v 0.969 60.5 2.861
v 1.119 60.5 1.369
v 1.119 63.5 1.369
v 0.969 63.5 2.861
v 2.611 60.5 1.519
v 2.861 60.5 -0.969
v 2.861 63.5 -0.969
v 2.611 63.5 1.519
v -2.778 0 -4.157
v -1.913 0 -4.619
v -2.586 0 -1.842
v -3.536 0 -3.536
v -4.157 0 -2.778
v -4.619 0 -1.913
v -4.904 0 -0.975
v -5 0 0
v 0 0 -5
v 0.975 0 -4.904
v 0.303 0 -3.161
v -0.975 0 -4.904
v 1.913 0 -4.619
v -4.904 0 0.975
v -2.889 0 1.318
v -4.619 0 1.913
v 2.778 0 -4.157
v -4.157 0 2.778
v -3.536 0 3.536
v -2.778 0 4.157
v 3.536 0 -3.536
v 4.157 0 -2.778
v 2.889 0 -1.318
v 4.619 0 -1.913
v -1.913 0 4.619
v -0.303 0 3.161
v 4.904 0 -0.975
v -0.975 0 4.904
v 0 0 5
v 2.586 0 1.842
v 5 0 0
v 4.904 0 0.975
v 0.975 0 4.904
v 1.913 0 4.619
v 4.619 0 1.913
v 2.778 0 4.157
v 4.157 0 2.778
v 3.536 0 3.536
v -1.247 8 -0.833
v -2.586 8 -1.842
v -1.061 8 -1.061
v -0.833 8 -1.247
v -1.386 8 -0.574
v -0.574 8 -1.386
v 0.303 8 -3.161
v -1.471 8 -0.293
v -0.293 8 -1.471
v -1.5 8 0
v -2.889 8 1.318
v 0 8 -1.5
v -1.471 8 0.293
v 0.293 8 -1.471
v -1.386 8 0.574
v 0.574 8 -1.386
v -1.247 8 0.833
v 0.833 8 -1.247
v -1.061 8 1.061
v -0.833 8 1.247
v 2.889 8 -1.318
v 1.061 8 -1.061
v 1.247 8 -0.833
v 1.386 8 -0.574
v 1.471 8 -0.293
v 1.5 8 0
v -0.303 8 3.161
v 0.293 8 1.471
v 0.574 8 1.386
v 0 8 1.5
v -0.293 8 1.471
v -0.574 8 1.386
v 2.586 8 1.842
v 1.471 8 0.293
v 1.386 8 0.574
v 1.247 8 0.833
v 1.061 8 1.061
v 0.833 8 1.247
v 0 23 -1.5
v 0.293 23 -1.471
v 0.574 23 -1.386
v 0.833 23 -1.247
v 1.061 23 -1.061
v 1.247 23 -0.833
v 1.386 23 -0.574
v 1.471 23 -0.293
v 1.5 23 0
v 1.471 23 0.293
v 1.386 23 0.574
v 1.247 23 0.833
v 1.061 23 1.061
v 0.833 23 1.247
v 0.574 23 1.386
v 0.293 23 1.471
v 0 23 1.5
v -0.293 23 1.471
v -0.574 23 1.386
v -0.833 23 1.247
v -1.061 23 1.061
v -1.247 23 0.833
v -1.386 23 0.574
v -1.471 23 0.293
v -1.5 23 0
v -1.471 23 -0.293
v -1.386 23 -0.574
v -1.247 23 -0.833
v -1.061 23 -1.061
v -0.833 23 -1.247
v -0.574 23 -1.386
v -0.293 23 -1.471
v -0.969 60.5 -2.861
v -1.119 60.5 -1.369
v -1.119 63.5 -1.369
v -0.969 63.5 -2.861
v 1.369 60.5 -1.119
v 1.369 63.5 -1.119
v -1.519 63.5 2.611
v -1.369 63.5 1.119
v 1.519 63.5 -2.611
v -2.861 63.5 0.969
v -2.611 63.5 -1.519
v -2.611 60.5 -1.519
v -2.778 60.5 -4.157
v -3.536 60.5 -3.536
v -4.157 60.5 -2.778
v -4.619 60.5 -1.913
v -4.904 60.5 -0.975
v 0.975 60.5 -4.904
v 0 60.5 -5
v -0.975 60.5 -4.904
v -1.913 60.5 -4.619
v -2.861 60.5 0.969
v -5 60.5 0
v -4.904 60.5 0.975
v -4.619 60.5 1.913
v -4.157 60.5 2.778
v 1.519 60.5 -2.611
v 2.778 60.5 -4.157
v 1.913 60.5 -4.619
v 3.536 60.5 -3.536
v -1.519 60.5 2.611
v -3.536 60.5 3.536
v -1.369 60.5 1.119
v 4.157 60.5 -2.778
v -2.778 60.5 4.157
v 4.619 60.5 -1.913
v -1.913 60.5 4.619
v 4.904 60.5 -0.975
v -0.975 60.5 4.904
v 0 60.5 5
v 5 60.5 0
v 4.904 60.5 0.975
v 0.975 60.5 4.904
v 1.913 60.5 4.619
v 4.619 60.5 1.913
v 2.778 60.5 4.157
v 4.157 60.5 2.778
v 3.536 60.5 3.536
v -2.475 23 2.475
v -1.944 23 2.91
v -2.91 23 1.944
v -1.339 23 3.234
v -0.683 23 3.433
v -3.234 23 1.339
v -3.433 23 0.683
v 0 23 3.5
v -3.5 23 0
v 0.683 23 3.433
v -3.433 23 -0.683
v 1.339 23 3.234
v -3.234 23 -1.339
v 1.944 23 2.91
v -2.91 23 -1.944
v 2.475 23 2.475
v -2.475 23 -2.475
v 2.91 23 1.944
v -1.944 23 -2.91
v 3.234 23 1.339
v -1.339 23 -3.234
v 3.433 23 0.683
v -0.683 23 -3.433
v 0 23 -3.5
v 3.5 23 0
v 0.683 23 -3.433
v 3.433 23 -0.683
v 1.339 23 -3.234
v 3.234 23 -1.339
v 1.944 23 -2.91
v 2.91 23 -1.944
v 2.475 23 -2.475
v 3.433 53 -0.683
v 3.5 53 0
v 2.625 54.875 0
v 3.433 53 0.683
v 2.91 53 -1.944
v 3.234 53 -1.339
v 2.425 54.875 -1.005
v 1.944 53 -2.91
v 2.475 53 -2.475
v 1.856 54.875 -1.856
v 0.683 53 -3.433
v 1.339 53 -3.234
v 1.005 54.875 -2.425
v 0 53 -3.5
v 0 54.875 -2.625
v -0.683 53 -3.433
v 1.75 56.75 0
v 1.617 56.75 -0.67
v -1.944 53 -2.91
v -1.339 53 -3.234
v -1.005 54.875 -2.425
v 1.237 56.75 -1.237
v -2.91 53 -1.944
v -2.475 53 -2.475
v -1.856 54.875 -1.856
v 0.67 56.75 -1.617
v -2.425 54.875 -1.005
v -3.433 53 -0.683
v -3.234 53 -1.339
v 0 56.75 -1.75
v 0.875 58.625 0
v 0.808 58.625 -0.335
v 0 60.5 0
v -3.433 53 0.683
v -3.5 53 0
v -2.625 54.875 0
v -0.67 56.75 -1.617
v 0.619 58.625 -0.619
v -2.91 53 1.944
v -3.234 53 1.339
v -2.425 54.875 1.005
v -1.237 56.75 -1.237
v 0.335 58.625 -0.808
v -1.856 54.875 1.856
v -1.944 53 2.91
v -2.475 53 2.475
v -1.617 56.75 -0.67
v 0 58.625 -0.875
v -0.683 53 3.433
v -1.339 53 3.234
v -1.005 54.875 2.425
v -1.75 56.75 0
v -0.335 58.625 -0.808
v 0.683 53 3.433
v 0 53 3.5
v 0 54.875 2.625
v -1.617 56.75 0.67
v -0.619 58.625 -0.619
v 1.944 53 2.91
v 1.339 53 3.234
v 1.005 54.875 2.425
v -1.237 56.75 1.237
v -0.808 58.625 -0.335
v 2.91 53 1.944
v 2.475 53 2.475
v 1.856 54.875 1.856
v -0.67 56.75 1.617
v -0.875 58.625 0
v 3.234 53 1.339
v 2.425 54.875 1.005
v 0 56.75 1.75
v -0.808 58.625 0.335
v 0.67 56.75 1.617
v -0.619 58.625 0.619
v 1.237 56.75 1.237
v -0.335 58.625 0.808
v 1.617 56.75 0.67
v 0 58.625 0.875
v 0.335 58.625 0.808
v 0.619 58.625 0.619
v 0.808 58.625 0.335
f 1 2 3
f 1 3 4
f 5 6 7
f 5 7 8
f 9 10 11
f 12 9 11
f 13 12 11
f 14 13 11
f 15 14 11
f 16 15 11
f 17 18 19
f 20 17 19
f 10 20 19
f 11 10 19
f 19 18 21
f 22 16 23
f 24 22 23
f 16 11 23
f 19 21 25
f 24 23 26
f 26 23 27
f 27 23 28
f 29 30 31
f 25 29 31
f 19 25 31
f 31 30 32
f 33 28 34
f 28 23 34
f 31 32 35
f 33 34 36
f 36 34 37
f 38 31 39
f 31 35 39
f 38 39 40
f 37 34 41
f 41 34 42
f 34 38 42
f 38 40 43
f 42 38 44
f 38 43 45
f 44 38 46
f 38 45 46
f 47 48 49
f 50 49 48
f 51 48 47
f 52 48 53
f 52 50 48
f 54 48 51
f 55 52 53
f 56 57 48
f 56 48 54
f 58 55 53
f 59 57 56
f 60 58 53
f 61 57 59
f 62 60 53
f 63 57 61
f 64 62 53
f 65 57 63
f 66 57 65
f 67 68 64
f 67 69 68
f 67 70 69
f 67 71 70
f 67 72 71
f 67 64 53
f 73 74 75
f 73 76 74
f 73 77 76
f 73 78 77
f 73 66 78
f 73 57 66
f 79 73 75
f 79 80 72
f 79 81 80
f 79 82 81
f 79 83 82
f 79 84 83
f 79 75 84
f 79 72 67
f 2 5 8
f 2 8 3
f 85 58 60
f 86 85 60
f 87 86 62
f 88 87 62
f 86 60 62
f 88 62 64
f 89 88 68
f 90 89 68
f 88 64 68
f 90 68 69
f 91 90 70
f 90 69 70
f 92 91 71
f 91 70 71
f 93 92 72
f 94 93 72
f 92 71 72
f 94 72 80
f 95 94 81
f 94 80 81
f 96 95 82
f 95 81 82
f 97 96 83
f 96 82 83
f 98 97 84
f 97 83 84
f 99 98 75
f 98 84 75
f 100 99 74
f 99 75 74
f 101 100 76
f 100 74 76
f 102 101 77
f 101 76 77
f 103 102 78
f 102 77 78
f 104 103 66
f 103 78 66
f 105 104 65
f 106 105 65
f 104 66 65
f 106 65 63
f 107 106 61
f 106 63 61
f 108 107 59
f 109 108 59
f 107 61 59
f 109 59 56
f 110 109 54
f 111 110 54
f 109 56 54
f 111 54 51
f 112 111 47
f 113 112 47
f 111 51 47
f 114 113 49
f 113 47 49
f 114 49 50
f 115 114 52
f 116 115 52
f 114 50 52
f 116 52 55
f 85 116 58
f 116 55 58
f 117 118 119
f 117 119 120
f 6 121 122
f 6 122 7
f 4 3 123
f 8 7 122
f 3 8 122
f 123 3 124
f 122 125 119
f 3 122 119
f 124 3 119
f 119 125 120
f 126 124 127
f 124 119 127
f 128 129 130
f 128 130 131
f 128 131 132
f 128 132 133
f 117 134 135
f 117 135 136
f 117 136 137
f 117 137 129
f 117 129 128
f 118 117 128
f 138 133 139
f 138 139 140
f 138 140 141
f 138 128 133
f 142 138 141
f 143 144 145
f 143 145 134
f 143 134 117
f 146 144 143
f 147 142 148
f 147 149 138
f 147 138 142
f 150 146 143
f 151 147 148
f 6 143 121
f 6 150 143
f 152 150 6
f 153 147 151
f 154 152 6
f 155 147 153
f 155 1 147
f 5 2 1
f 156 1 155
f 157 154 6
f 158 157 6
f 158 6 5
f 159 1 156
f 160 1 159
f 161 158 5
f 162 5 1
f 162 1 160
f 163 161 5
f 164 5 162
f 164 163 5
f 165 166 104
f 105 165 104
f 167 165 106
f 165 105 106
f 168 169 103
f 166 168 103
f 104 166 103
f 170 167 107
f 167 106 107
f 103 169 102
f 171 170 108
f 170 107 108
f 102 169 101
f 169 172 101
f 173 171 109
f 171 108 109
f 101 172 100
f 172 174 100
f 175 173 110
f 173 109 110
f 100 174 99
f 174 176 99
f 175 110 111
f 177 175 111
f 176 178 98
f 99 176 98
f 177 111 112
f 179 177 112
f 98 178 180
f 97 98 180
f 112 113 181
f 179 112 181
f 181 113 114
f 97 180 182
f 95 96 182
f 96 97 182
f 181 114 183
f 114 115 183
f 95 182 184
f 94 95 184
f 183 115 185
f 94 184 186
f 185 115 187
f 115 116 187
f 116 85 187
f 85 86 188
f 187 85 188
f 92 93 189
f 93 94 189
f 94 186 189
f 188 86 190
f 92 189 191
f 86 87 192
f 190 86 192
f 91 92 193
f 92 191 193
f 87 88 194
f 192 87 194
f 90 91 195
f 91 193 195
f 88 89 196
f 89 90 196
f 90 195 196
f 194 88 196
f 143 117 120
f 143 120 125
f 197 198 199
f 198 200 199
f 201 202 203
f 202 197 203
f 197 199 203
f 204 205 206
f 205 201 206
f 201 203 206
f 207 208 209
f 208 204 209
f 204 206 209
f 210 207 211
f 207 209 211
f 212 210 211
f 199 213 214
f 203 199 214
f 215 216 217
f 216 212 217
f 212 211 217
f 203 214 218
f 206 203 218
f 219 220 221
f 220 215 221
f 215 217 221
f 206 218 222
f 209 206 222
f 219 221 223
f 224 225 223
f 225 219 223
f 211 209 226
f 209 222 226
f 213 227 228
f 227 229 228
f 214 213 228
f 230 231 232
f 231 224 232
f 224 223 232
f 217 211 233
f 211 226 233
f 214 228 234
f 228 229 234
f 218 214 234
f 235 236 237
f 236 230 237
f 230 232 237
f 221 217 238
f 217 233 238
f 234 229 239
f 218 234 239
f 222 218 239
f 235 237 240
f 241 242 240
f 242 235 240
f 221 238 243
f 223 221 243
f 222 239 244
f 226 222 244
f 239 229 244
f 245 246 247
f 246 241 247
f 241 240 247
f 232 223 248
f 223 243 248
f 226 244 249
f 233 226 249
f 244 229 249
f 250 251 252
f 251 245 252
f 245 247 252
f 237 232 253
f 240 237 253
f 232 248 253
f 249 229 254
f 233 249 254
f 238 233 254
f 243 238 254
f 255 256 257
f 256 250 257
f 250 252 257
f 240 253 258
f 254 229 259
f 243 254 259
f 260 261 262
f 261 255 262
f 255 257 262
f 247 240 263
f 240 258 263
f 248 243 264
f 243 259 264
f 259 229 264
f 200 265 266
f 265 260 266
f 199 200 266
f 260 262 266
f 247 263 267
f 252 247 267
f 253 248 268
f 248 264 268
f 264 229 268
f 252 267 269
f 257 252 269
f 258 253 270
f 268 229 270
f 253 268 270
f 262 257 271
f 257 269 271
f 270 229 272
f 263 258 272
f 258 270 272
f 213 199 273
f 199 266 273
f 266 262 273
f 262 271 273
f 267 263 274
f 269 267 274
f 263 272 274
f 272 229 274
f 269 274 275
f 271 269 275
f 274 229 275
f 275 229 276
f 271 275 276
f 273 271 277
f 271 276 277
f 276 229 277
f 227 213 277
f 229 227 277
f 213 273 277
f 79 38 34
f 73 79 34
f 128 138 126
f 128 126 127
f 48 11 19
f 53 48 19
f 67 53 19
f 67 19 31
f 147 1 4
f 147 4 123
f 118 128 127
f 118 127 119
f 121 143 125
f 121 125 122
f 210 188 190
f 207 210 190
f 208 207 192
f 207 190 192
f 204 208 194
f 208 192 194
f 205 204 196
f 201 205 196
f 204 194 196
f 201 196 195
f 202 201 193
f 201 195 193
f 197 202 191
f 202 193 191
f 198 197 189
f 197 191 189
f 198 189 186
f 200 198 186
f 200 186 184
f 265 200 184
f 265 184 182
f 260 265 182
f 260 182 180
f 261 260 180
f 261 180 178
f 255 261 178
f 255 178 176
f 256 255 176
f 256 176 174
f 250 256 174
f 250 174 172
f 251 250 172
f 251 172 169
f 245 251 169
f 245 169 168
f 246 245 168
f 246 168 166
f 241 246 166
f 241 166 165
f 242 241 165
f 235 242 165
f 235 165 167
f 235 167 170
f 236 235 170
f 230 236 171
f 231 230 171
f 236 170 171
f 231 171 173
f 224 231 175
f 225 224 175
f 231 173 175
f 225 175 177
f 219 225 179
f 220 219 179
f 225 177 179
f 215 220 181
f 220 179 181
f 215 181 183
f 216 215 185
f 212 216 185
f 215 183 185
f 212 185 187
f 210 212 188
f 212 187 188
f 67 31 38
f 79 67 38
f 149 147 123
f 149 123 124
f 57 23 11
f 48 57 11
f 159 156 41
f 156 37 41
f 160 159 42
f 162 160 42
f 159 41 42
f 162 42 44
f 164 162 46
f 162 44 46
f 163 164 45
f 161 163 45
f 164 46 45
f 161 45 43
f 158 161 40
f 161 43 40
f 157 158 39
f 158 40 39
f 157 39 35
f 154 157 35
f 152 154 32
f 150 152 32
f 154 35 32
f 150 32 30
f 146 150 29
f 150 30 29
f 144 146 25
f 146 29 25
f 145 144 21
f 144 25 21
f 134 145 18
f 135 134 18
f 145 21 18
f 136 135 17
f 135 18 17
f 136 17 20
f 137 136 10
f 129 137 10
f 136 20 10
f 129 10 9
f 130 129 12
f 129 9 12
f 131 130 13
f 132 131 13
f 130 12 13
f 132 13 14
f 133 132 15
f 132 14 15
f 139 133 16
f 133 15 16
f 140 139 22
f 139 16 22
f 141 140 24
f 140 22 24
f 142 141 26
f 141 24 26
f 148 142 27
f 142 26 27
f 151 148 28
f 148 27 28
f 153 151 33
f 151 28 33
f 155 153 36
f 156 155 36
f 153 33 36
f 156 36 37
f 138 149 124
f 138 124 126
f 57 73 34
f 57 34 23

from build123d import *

# Parameters (mm, degrees)
SKETCH_1_R          = 5
EXTRUDE_1_DEPTH     = 2
EXTRUDE_2_DEPTH     = 3.5
EXTRUDE_3_DEPTH     = 3.5
SKETCH_4_R          = 5
EXTRUDE_4_DEPTH     = 0.5
CUT_EXTRUDE_2_DEPTH = 3
CUT_EXTRUDE_3_DEPTH = 2
EXTRUDE_5_DEPTH     = 58
SKETCH_8_R          = 5
EXTRUDE_6_DEPTH     = 58
CUT_EXTRUDE_4_DEPTH = 8
SKETCH_10_R         = 1.5
CUT_EXTRUDE_5_DEPTH = 15
SKETCH_11_R         = 3.5
CUT_EXTRUDE_6_DEPTH = 30
SKETCH_12_R         = 1
CUT_EXTRUDE_7_DEPTH = 7
SKETCH_13_R         = 3.5
SKETCH_14_R         = 1


# Read off the part's stored shape, not the designer's step: 切除-扫描1
with BuildPart() as part:
    # 草图1 → 凸台-拉伸1 (new body)
    with BuildSketch(Plane(origin=(0, 0, 0), x_dir=(1, 0, 0), z_dir=(0, 1, 0))):
        with Locations(Location((0, 0, 0), (0, 0, 270))):
            Circle(SKETCH_1_R)
        Polygon((2.55392077, -1.838021228), (2.868733461, 1.292749652), (0.314812691, 3.13077088), (-2.55392077, 1.838021228), (-2.868733461, -1.292749652), (-0.314812691, -3.13077088), align=None, mode=Mode.SUBTRACT)
    extrude(amount=EXTRUDE_1_DEPTH)

    # 草图2 → 凸台-拉伸2 (add)
    with BuildSketch(Plane(origin=(0, 2, 0), x_dir=(1, 0, 0), z_dir=(0, 1, 0))):
        Polygon((-2.834872538, 1.792623133), (3.135022029, 1.192324151), (2.834872538, -1.792623133), (-3.135022029, -1.192324151), align=None)
    extrude(amount=EXTRUDE_2_DEPTH)

    # 草图3 → 凸台-拉伸3 (add)
    with BuildSketch(Plane(origin=(0, 2, 0), x_dir=(1, 0, 0), z_dir=(0, 1, 0))):
        Polygon((-1.192324151, 3.135022029), (-1.792623133, -2.834872538), (1.192324151, -3.135022029), (1.792623133, 2.834872538), align=None)
    extrude(amount=EXTRUDE_3_DEPTH)

    # 草图4 → 凸台-拉伸4 (add)
    with BuildSketch(Plane(origin=(0, 2, 0), x_dir=(1, 0, 0), z_dir=(0, 1, 0))):
        with Locations(Location((0, 0, 0), (0, 0, 270))):
            Circle(SKETCH_4_R)
    extrude(amount=EXTRUDE_4_DEPTH)

    # 草图5 → 切除-拉伸2 (cut)
    with BuildSketch(Plane(origin=(0, 5.5, 0), x_dir=(1, 0, 0), z_dir=(0, 1, 0))):
        Polygon((-3.135022029, -1.192324151), (-2.834872538, 1.792623133), (-1.342398896, 1.642548387), (-1.192324151, 3.135022029), (1.792623133, 2.834872538), (1.642548387, 1.342398896), (3.135022029, 1.192324151), (2.834872538, -1.792623133), (1.342398896, -1.642548387), (1.192324151, -3.135022029), (-1.792623133, -2.834872538), (-1.642548387, -1.342398896), align=None)
        Polygon((-1.093653289, 1.617535929), (-0.968591001, 2.861263964), (1.518865068, 2.611139388), (1.39380278, 1.367411354), (1.368790323, 1.118665747), (1.617535929, 1.093653289), (2.861263964, 0.968591001), (2.611139388, -1.518865068), (1.367411354, -1.39380278), (1.118665747, -1.368790323), (1.093653289, -1.617535929), (0.968591001, -2.861263964), (-1.518865068, -2.611139388), (-1.39380278, -1.367411354), (-1.368790323, -1.118665747), (-1.617535929, -1.093653289), (-2.861263964, -0.968591001), (-2.611139388, 1.518865068), (-1.367411354, 1.39380278), (-1.118665747, 1.368790323), align=None, mode=Mode.SUBTRACT)
    extrude(amount=-CUT_EXTRUDE_2_DEPTH, mode=Mode.SUBTRACT)

    # 草图6 → 切除-拉伸3 (cut)
    with BuildSketch(Plane.XZ):
        Polygon((2.888759724, -1.318484202), (2.586220675, 1.842497205), (-0.302539048, 3.160981407), (-2.888759724, 1.318484202), (-2.586220675, -1.842497205), (0.302539048, -3.160981407), align=None)
    extrude(amount=-CUT_EXTRUDE_3_DEPTH, mode=Mode.SUBTRACT)

    # 草图7 → 凸台-拉伸5 (add)
    with BuildSketch(Plane(origin=(0, 5.5, 0), x_dir=(1, 0, 0), z_dir=(0, 1, 0))):
        Polygon((-1.118665747, 1.368790323), (-0.968591001, 2.861263964), (1.518865068, 2.611139388), (1.368790323, 1.118665747), (2.861263964, 0.968591001), (2.611139388, -1.518865068), (1.118665747, -1.368790323), (0.968591001, -2.861263964), (-1.518865068, -2.611139388), (-1.368790323, -1.118665747), (-2.861263964, -0.968591001), (-2.611139388, 1.518865068), align=None)
    extrude(amount=EXTRUDE_5_DEPTH)

    # 草图8 → 凸台-拉伸6 (add)
    with BuildSketch(Plane(origin=(0, 2.5, 0), x_dir=(1, 0, 0), z_dir=(0, 1, 0))):
        with Locations(Location((0, 0, 0), (0, 0, 270))):
            Circle(SKETCH_8_R)
    extrude(amount=EXTRUDE_6_DEPTH)

    # 草图9 → 切除-拉伸4 (cut)
    with BuildSketch(Plane.XZ):
        Polygon((2.888759724, -1.318484202), (2.586220675, 1.842497205), (-0.302539048, 3.160981407), (-2.888759724, 1.318484202), (-2.586220675, -1.842497205), (0.302539048, -3.160981407), align=None)
    extrude(amount=-CUT_EXTRUDE_4_DEPTH, mode=Mode.SUBTRACT)

    # 草图10 → 切除-拉伸5 (cut)
    with BuildSketch(Plane.XZ.offset(-8)):
        with Locations(Location((0, 0, 0), (0, 0, 270))):
            Circle(SKETCH_10_R)
    extrude(amount=-CUT_EXTRUDE_5_DEPTH, mode=Mode.SUBTRACT)

    # 草图11 → 切除-拉伸6 (cut)
    with BuildSketch(Plane.XZ.offset(-23)):
        with Locations(Location((0, 0, 0), (0, 0, 270))):
            Circle(SKETCH_11_R)
    extrude(amount=-CUT_EXTRUDE_6_DEPTH, mode=Mode.SUBTRACT)

    # 草图12 → 切除-拉伸7 (cut)
    with BuildSketch(Plane.XZ.offset(-53)):
        with Locations(Location((0, 0, 0), (0, 0, 270))):
            Circle(SKETCH_12_R)
    extrude(amount=-CUT_EXTRUDE_7_DEPTH, mode=Mode.SUBTRACT)

    # 草图13 → 放样1 section 0
    with BuildSketch(Plane.XZ.offset(-53)):
        Circle(SKETCH_13_R)
    # 草图14 → 放样1 section 1
    with BuildSketch(Plane.XZ.offset(-60)):
        Circle(SKETCH_14_R)
    loft()

    # 切除-扫描1 outline → 切除-扫描1 (revolve, cut)
    with BuildSketch(Plane.XY):
        Polygon((3.5, 53), (0, 60.5), (0, 53), align=None)
    revolve(axis=Axis((0, 0, 0), (0, 1, 0)), mode=Mode.SUBTRACT)


solid = part.part
